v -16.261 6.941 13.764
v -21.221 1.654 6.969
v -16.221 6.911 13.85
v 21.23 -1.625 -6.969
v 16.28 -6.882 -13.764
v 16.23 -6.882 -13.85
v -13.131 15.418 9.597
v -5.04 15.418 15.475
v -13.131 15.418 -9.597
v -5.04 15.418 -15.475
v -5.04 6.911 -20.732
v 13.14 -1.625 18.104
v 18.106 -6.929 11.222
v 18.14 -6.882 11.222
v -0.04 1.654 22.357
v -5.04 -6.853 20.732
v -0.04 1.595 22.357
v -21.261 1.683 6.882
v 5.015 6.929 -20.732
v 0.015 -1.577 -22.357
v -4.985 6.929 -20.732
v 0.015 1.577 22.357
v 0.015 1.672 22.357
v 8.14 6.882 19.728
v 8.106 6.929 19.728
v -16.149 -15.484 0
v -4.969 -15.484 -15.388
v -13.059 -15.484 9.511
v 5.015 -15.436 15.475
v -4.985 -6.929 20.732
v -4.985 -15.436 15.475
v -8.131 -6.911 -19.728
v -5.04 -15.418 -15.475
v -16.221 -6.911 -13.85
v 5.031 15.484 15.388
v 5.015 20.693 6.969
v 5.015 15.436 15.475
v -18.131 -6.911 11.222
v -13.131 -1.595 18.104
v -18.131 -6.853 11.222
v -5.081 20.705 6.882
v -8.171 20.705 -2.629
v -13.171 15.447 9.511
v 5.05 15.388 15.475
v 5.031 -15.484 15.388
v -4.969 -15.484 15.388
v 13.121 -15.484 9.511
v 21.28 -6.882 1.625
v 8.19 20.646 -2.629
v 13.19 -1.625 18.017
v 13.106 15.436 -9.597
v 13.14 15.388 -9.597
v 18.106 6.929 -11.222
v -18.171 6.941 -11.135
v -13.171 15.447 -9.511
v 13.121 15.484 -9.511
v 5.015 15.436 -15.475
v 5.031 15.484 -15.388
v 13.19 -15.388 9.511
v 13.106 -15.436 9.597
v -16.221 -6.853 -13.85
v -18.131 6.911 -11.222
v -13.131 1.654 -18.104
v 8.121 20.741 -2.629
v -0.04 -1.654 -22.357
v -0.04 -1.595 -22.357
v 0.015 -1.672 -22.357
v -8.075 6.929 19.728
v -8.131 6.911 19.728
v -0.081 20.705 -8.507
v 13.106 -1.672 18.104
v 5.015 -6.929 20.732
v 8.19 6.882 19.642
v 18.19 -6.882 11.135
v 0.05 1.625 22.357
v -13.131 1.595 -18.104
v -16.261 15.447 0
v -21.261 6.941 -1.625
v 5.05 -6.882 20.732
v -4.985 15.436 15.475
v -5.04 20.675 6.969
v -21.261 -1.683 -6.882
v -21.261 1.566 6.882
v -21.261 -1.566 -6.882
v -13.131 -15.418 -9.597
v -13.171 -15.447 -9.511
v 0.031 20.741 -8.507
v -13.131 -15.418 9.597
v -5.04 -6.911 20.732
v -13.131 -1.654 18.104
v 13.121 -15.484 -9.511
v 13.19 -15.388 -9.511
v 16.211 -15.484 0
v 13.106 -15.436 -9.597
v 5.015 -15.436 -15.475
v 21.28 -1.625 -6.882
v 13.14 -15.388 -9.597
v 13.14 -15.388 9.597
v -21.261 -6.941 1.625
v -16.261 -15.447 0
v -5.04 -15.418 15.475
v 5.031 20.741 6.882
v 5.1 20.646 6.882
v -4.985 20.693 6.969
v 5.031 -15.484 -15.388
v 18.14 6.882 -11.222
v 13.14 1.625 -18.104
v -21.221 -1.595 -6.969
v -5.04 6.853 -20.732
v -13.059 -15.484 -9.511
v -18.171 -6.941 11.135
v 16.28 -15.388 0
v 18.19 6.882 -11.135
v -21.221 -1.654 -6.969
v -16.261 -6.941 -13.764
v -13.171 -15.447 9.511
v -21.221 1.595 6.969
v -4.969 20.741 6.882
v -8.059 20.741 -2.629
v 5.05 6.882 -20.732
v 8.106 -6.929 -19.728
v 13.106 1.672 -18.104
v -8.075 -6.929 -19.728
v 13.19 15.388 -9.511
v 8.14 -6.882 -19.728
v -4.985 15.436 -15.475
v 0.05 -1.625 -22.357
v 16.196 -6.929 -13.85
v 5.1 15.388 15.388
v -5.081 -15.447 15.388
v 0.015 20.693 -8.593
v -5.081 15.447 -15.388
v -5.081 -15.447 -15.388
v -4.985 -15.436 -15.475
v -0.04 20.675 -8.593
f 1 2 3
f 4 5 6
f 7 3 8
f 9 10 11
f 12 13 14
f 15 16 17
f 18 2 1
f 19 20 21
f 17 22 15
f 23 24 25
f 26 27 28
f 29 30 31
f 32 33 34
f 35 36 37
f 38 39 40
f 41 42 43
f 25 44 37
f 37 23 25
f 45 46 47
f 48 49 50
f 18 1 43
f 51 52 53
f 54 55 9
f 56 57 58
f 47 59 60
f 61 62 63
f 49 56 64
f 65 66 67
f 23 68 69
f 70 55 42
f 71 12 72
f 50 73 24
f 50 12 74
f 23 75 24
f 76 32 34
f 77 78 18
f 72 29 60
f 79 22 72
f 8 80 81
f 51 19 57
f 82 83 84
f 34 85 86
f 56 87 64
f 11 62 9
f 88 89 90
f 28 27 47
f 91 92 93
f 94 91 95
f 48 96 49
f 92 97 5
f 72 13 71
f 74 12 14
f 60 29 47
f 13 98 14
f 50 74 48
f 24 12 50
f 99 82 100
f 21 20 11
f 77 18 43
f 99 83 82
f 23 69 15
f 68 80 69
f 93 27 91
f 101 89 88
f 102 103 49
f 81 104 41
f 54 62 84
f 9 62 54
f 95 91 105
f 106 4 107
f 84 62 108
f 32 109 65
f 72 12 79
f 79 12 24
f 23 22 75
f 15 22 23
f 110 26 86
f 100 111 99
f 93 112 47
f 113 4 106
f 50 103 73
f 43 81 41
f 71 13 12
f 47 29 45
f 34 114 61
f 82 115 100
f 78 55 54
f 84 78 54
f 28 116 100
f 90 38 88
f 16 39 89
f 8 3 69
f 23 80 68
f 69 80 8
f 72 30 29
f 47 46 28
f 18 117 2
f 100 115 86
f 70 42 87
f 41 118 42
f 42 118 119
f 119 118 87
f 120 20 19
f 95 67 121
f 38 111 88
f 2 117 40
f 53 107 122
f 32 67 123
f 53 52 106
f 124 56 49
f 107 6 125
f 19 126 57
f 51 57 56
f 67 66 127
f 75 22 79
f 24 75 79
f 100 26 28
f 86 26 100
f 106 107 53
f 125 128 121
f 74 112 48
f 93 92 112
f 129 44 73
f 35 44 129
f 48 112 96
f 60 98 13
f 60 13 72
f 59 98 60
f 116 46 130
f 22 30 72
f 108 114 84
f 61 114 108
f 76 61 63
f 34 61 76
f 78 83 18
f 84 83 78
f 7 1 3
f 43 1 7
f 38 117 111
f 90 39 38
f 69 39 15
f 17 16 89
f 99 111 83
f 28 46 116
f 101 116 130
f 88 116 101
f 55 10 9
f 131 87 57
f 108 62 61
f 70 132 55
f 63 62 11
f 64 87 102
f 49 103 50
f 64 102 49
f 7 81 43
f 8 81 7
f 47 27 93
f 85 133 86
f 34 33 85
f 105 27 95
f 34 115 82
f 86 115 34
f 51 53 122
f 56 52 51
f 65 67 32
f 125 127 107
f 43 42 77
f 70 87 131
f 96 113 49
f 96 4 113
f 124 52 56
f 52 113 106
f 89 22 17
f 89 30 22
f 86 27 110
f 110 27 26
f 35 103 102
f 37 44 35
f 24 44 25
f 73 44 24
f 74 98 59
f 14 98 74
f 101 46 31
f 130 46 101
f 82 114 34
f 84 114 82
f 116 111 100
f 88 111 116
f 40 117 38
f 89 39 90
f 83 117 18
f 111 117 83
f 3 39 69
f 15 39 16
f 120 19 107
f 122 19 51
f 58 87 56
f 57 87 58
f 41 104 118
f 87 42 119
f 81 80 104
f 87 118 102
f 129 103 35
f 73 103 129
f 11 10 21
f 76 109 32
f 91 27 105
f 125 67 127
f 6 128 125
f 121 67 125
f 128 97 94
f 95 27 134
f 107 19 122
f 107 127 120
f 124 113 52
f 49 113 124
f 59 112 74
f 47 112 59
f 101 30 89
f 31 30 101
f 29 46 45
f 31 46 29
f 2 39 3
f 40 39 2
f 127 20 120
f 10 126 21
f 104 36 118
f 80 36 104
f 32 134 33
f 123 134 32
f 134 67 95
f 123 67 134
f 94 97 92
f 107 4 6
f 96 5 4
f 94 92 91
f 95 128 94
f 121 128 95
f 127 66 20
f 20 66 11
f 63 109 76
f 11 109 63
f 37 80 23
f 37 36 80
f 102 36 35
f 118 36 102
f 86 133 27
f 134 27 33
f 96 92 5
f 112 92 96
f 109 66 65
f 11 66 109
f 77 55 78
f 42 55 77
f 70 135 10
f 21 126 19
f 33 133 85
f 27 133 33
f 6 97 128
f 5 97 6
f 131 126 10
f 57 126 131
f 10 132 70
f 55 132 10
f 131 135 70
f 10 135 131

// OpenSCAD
// Auto-generated OpenSCAD file

    inner_points = 10*[[1.30901696039044, -1.5388417782265715, 0.9510565474746461], [-2.1180339733846583, 0.6881910044632044, -0.16245986108672694], [1.8090169796137625, -0.6881909777335578, 1.1135163775781873], [-1.6180339541613356, 1.5388418049562185, -3.0983185683730596e-08], [1.6180339541612156, -1.538841804956286, 3.0983185683730596e-08], [-1.8090169796138824, 0.68819097773349, -1.1135163775781873], [2.1180339733845384, -0.6881910044632721, 0.16245986108672694], [-1.30901696039056, 1.538841778226504, -0.9510565474746461], [-0.5000000141570125, -0.6881909060497494, 2.064572895340174], [-1.3090169968820657, -0.16245978121444532, 1.801707328858261], [5.066310430925828e-09, 0.1624598944432645, 2.227032725443715], [-0.8090169776587427, 0.6881910192785686, 1.9641671589618024], [0.809016977658623, -0.6881910192786364, -1.9641671589618024], [-5.066430170716978e-09, -0.16245989444333217, -2.227032725443715], [1.3090169968819458, 0.16245978121437765, -1.801707328858261], [0.5000000141568928, 0.6881909060496817, -2.064572895340174], [-1.618034023338573, -1.5388417322190338, 3.303893986172923e-08], [0.5000000468426242, 2.0645728837839843, 0.6881909169706076], [-1.3090170295677974, -1.538841758948748, -0.9510564834525206], [0.8090170406134, 2.06457285705427, -0.26286559952085276], [-2.118033992838755, -0.16245981482511987, -0.6881909555105802], [-0.8090169481364942, 2.064572893422896, -0.26286559849297564], [0.49999998584298705, -0.6881909285267964, 2.0645728947049107], [-1.6180339724070885, 0.6881910252357436, 1.376381907183268], [1.6180339724069686, -0.6881910252358113, -1.376381907183268], [-0.49999998584310684, 0.6881909285267287, -2.0645728947049107], [-1.3090170283594544, -1.5388417193808985, 0.9510565491377863], [0.5000000355661287, 1.5388417893601316, 1.5388417362589322], [-0.5000000355662484, -1.538841789360199, -1.5388417362589322], [1.3090170283593345, 1.538841719380831, -0.9510565491377863], [0.4999999663888912, -1.5388417478151206, 1.5388418002810578], [-2.118033984661154, 0.16245991003935126, 0.6881909582015976], [1.3090169918678283, -0.16245984006011832, 1.8017073271951207], [-1.309016959182217, 1.5388418177943537, 0.9510564851156607], [1.309016959182097, -1.5388418177944212, -0.9510564851156607], [-1.3090169918679482, 0.16245984006005065, -1.8017073271951207], [2.118033984661034, -0.16245991003941893, -0.6881909582015976], [-0.499999966389011, 1.5388417478150531, -1.5388418002810578], [-0.5000000336111086, -1.5388417253380735, 1.5388418009163205], [-1.8090170091361313, -0.6881908964108379, 1.1135163798765904], [0.8090170110911518, 0.6881909829099426, 1.9641671579339253], [-0.49999996443387096, 1.5388418118371785, 1.5388417368941951], [0.49999996443375117, -1.538841811837246, -1.5388417368941951], [-0.8090170110912714, -0.6881909829100104, -1.9641671579339253], [1.8090170091360114, 0.6881908964107701, -1.1135163798765904], [0.5000000336109889, 1.538841725338006, -1.5388418009163205], [-2.1180340041152497, -0.688190909248973, 0.16245986377774424], [-0.49999995315737555, 2.064572906261031, 0.6881909176058706], [-1.6180340050928197, -0.6881909524985592, -1.3763819051275137], [4.586505433710224e-08, 2.064572863011445, -0.8506508512993872]];

    outer_points = 10*[[-0.8090170110916863, -0.6881908812857832, 1.9641671935400922], [1.3090170295679837, 1.538841709741917, -0.95105656307045], [-0.5000000355665741, -1.538841709741917, 1.5388418158770538], [1.6180340050930957, 0.6881908812857832, -1.3763819407334883], [-1.6180340050930957, -0.6881908812857832, 1.3763819407334883], [0.5000000355665741, 1.538841709741917, -1.5388418158770538], [-1.3090170295679837, -1.538841709741917, 0.95105656307045], [0.8090170110916863, 0.6881908812857832, -1.9641671935400922], [1.3090169968815815, 0.1624598744330541, 1.8017073204530507], [1.809017009135817, 0.6881909540230795, 1.113516344270661], [1.6180339724066932, -0.6881909540230795, 1.3763819427900126], [2.118033984660929, -0.1624598744330541, 0.6881909666076228], [-2.118033984660929, 0.1624598744330541, -0.6881909666076228], [-1.6180339724066932, 0.6881909540230795, -1.3763819427900126], [-1.809017009135817, -0.6881909540230795, -1.113516344270661], [-1.3090169968815815, -0.1624598744330541, -1.8017073204530507], [4.5864941067286225e-08, 2.06457290702336, 0.8506507444803071], [1.309016960390704, -1.5388418274333344, -0.9510564678560931], [-0.8090169481364684, 2.06457290702336, 0.26286549167370316], [0.4999999663892946, -1.5388418274333344, -1.538841720662697], [0.5000000468428755, 2.064572848177651, -0.6881910237895683], [1.3090169918683128, -0.16245993327876307, -1.8017073187892874], [0.8090169776582082, -0.6881909176544313, 1.9641671945683543], [2.118034004115161, 0.6881909176544313, 0.1624598281718883], [-2.118034004115161, -0.6881909176544313, -0.1624598281718883], [-0.8090169776582082, 0.6881909176544313, -1.9641671945683543], [0.5000000336107052, 1.5388418049562738, 1.538841721298198], [1.6180339541612545, -1.5388418049562738, 4.863544078581583e-08], [-1.6180339541612545, 1.5388418049562738, -4.863544078581583e-08], [-0.5000000336107052, -1.5388418049562738, -1.538841721298198], [-5.066900010675113e-09, -0.16245977921869703, 2.227032733849236], [1.6180340233385344, 1.5388417322189776, -4.657891639059386e-08], [0.4999999644334254, -1.5388417322189776, 1.538841816512555], [2.1180339928388596, 0.16245977921869703, -0.6881909639155974], [-2.1180339928388596, -0.16245977921869703, 0.6881909639155974], [-0.4999999644334254, 1.5388417322189776, -1.538841816512555], [-1.6180340233385344, -1.5388417322189776, 4.657891639059386e-08], [5.066900010675113e-09, 0.16245977921869703, -2.227032733849236], [0.5000000141564732, 0.6881910128687885, 2.0645728597339326], [1.3090170283591904, 1.5388417685876257, 0.9510564695198562], [1.3090169591819105, -1.5388417685876257, 0.9510565647342133], [2.1180339733846276, -0.6881910128687885, -0.16245982547986293], [-2.1180339733846276, 0.6881910128687885, 0.16245982547986293], [-1.3090169591819105, 1.5388417685876257, -0.9510565647342133], [-1.3090170283591904, -1.5388417685876257, -0.9510564695198562], [-0.5000000141564732, -0.6881910128687885, -2.0645728597339326], [0.8090170406134262, 2.064572870654712, 0.26286549270196535], [1.8090169796140771, -0.6881910353458492, -1.1135163419713967], [-0.4999999531571243, 2.064572870654712, -0.6881910244250694], [0.4999999858435267, -0.6881910353458492, -2.0645728590984316]];

    // Convex hull for inner set (I)
    module inner_hull() {
        hull() {
            for (p = inner_points) {
                translate(p) sphere(r=0.1);
            }
        }
    }

    // Convex hull for outer set (O) minus inner hull (O \ I)
    module outer_minus_inner() {
        difference() {
            hull() {
                for (p = outer_points) {
                    translate(p) sphere(r=0.1);
                }
            }
            inner_hull(); // Subtract inner hull
        }
    }

    // Convex hull for outer set (O) minus all translated inner hulls
    module outer_minus_AllTranslationInner() {
        difference() {
            hull() {
                for (p = outer_points) {
                    translate(p) sphere(r=0.1);
                }
            }
            hull() {
                translate([0,0,50]) inner_hull();
                translate([0,0,-50]) inner_hull();
            }; // Subtract translated inner hulls
        }
    }

    // Difference between outer_minus_inner and outer_minus_AllTranslationInner
    module outer_minus_inner_diff() {
        difference() {
            // Outer minus inner
            difference() {
                hull() {
                    for (p = outer_points) {
                        translate(p) sphere(r=0.1);
                    }
                }
                inner_hull();
            }

            // Subtract Outer minus AllTranslationInner
            difference() {
                hull() {
                    for (p = outer_points) {
                        translate(p) sphere(r=0.1);
                    }
                }
                hull() {
                    translate([0,0,50]) inner_hull();
                    translate([0,0,-50]) inner_hull();
                };
            }
        }
    }

    // Rendering all with colors applied
    color([1, 0, 0, 0.5]) inner_hull(); // Transparent red
    
